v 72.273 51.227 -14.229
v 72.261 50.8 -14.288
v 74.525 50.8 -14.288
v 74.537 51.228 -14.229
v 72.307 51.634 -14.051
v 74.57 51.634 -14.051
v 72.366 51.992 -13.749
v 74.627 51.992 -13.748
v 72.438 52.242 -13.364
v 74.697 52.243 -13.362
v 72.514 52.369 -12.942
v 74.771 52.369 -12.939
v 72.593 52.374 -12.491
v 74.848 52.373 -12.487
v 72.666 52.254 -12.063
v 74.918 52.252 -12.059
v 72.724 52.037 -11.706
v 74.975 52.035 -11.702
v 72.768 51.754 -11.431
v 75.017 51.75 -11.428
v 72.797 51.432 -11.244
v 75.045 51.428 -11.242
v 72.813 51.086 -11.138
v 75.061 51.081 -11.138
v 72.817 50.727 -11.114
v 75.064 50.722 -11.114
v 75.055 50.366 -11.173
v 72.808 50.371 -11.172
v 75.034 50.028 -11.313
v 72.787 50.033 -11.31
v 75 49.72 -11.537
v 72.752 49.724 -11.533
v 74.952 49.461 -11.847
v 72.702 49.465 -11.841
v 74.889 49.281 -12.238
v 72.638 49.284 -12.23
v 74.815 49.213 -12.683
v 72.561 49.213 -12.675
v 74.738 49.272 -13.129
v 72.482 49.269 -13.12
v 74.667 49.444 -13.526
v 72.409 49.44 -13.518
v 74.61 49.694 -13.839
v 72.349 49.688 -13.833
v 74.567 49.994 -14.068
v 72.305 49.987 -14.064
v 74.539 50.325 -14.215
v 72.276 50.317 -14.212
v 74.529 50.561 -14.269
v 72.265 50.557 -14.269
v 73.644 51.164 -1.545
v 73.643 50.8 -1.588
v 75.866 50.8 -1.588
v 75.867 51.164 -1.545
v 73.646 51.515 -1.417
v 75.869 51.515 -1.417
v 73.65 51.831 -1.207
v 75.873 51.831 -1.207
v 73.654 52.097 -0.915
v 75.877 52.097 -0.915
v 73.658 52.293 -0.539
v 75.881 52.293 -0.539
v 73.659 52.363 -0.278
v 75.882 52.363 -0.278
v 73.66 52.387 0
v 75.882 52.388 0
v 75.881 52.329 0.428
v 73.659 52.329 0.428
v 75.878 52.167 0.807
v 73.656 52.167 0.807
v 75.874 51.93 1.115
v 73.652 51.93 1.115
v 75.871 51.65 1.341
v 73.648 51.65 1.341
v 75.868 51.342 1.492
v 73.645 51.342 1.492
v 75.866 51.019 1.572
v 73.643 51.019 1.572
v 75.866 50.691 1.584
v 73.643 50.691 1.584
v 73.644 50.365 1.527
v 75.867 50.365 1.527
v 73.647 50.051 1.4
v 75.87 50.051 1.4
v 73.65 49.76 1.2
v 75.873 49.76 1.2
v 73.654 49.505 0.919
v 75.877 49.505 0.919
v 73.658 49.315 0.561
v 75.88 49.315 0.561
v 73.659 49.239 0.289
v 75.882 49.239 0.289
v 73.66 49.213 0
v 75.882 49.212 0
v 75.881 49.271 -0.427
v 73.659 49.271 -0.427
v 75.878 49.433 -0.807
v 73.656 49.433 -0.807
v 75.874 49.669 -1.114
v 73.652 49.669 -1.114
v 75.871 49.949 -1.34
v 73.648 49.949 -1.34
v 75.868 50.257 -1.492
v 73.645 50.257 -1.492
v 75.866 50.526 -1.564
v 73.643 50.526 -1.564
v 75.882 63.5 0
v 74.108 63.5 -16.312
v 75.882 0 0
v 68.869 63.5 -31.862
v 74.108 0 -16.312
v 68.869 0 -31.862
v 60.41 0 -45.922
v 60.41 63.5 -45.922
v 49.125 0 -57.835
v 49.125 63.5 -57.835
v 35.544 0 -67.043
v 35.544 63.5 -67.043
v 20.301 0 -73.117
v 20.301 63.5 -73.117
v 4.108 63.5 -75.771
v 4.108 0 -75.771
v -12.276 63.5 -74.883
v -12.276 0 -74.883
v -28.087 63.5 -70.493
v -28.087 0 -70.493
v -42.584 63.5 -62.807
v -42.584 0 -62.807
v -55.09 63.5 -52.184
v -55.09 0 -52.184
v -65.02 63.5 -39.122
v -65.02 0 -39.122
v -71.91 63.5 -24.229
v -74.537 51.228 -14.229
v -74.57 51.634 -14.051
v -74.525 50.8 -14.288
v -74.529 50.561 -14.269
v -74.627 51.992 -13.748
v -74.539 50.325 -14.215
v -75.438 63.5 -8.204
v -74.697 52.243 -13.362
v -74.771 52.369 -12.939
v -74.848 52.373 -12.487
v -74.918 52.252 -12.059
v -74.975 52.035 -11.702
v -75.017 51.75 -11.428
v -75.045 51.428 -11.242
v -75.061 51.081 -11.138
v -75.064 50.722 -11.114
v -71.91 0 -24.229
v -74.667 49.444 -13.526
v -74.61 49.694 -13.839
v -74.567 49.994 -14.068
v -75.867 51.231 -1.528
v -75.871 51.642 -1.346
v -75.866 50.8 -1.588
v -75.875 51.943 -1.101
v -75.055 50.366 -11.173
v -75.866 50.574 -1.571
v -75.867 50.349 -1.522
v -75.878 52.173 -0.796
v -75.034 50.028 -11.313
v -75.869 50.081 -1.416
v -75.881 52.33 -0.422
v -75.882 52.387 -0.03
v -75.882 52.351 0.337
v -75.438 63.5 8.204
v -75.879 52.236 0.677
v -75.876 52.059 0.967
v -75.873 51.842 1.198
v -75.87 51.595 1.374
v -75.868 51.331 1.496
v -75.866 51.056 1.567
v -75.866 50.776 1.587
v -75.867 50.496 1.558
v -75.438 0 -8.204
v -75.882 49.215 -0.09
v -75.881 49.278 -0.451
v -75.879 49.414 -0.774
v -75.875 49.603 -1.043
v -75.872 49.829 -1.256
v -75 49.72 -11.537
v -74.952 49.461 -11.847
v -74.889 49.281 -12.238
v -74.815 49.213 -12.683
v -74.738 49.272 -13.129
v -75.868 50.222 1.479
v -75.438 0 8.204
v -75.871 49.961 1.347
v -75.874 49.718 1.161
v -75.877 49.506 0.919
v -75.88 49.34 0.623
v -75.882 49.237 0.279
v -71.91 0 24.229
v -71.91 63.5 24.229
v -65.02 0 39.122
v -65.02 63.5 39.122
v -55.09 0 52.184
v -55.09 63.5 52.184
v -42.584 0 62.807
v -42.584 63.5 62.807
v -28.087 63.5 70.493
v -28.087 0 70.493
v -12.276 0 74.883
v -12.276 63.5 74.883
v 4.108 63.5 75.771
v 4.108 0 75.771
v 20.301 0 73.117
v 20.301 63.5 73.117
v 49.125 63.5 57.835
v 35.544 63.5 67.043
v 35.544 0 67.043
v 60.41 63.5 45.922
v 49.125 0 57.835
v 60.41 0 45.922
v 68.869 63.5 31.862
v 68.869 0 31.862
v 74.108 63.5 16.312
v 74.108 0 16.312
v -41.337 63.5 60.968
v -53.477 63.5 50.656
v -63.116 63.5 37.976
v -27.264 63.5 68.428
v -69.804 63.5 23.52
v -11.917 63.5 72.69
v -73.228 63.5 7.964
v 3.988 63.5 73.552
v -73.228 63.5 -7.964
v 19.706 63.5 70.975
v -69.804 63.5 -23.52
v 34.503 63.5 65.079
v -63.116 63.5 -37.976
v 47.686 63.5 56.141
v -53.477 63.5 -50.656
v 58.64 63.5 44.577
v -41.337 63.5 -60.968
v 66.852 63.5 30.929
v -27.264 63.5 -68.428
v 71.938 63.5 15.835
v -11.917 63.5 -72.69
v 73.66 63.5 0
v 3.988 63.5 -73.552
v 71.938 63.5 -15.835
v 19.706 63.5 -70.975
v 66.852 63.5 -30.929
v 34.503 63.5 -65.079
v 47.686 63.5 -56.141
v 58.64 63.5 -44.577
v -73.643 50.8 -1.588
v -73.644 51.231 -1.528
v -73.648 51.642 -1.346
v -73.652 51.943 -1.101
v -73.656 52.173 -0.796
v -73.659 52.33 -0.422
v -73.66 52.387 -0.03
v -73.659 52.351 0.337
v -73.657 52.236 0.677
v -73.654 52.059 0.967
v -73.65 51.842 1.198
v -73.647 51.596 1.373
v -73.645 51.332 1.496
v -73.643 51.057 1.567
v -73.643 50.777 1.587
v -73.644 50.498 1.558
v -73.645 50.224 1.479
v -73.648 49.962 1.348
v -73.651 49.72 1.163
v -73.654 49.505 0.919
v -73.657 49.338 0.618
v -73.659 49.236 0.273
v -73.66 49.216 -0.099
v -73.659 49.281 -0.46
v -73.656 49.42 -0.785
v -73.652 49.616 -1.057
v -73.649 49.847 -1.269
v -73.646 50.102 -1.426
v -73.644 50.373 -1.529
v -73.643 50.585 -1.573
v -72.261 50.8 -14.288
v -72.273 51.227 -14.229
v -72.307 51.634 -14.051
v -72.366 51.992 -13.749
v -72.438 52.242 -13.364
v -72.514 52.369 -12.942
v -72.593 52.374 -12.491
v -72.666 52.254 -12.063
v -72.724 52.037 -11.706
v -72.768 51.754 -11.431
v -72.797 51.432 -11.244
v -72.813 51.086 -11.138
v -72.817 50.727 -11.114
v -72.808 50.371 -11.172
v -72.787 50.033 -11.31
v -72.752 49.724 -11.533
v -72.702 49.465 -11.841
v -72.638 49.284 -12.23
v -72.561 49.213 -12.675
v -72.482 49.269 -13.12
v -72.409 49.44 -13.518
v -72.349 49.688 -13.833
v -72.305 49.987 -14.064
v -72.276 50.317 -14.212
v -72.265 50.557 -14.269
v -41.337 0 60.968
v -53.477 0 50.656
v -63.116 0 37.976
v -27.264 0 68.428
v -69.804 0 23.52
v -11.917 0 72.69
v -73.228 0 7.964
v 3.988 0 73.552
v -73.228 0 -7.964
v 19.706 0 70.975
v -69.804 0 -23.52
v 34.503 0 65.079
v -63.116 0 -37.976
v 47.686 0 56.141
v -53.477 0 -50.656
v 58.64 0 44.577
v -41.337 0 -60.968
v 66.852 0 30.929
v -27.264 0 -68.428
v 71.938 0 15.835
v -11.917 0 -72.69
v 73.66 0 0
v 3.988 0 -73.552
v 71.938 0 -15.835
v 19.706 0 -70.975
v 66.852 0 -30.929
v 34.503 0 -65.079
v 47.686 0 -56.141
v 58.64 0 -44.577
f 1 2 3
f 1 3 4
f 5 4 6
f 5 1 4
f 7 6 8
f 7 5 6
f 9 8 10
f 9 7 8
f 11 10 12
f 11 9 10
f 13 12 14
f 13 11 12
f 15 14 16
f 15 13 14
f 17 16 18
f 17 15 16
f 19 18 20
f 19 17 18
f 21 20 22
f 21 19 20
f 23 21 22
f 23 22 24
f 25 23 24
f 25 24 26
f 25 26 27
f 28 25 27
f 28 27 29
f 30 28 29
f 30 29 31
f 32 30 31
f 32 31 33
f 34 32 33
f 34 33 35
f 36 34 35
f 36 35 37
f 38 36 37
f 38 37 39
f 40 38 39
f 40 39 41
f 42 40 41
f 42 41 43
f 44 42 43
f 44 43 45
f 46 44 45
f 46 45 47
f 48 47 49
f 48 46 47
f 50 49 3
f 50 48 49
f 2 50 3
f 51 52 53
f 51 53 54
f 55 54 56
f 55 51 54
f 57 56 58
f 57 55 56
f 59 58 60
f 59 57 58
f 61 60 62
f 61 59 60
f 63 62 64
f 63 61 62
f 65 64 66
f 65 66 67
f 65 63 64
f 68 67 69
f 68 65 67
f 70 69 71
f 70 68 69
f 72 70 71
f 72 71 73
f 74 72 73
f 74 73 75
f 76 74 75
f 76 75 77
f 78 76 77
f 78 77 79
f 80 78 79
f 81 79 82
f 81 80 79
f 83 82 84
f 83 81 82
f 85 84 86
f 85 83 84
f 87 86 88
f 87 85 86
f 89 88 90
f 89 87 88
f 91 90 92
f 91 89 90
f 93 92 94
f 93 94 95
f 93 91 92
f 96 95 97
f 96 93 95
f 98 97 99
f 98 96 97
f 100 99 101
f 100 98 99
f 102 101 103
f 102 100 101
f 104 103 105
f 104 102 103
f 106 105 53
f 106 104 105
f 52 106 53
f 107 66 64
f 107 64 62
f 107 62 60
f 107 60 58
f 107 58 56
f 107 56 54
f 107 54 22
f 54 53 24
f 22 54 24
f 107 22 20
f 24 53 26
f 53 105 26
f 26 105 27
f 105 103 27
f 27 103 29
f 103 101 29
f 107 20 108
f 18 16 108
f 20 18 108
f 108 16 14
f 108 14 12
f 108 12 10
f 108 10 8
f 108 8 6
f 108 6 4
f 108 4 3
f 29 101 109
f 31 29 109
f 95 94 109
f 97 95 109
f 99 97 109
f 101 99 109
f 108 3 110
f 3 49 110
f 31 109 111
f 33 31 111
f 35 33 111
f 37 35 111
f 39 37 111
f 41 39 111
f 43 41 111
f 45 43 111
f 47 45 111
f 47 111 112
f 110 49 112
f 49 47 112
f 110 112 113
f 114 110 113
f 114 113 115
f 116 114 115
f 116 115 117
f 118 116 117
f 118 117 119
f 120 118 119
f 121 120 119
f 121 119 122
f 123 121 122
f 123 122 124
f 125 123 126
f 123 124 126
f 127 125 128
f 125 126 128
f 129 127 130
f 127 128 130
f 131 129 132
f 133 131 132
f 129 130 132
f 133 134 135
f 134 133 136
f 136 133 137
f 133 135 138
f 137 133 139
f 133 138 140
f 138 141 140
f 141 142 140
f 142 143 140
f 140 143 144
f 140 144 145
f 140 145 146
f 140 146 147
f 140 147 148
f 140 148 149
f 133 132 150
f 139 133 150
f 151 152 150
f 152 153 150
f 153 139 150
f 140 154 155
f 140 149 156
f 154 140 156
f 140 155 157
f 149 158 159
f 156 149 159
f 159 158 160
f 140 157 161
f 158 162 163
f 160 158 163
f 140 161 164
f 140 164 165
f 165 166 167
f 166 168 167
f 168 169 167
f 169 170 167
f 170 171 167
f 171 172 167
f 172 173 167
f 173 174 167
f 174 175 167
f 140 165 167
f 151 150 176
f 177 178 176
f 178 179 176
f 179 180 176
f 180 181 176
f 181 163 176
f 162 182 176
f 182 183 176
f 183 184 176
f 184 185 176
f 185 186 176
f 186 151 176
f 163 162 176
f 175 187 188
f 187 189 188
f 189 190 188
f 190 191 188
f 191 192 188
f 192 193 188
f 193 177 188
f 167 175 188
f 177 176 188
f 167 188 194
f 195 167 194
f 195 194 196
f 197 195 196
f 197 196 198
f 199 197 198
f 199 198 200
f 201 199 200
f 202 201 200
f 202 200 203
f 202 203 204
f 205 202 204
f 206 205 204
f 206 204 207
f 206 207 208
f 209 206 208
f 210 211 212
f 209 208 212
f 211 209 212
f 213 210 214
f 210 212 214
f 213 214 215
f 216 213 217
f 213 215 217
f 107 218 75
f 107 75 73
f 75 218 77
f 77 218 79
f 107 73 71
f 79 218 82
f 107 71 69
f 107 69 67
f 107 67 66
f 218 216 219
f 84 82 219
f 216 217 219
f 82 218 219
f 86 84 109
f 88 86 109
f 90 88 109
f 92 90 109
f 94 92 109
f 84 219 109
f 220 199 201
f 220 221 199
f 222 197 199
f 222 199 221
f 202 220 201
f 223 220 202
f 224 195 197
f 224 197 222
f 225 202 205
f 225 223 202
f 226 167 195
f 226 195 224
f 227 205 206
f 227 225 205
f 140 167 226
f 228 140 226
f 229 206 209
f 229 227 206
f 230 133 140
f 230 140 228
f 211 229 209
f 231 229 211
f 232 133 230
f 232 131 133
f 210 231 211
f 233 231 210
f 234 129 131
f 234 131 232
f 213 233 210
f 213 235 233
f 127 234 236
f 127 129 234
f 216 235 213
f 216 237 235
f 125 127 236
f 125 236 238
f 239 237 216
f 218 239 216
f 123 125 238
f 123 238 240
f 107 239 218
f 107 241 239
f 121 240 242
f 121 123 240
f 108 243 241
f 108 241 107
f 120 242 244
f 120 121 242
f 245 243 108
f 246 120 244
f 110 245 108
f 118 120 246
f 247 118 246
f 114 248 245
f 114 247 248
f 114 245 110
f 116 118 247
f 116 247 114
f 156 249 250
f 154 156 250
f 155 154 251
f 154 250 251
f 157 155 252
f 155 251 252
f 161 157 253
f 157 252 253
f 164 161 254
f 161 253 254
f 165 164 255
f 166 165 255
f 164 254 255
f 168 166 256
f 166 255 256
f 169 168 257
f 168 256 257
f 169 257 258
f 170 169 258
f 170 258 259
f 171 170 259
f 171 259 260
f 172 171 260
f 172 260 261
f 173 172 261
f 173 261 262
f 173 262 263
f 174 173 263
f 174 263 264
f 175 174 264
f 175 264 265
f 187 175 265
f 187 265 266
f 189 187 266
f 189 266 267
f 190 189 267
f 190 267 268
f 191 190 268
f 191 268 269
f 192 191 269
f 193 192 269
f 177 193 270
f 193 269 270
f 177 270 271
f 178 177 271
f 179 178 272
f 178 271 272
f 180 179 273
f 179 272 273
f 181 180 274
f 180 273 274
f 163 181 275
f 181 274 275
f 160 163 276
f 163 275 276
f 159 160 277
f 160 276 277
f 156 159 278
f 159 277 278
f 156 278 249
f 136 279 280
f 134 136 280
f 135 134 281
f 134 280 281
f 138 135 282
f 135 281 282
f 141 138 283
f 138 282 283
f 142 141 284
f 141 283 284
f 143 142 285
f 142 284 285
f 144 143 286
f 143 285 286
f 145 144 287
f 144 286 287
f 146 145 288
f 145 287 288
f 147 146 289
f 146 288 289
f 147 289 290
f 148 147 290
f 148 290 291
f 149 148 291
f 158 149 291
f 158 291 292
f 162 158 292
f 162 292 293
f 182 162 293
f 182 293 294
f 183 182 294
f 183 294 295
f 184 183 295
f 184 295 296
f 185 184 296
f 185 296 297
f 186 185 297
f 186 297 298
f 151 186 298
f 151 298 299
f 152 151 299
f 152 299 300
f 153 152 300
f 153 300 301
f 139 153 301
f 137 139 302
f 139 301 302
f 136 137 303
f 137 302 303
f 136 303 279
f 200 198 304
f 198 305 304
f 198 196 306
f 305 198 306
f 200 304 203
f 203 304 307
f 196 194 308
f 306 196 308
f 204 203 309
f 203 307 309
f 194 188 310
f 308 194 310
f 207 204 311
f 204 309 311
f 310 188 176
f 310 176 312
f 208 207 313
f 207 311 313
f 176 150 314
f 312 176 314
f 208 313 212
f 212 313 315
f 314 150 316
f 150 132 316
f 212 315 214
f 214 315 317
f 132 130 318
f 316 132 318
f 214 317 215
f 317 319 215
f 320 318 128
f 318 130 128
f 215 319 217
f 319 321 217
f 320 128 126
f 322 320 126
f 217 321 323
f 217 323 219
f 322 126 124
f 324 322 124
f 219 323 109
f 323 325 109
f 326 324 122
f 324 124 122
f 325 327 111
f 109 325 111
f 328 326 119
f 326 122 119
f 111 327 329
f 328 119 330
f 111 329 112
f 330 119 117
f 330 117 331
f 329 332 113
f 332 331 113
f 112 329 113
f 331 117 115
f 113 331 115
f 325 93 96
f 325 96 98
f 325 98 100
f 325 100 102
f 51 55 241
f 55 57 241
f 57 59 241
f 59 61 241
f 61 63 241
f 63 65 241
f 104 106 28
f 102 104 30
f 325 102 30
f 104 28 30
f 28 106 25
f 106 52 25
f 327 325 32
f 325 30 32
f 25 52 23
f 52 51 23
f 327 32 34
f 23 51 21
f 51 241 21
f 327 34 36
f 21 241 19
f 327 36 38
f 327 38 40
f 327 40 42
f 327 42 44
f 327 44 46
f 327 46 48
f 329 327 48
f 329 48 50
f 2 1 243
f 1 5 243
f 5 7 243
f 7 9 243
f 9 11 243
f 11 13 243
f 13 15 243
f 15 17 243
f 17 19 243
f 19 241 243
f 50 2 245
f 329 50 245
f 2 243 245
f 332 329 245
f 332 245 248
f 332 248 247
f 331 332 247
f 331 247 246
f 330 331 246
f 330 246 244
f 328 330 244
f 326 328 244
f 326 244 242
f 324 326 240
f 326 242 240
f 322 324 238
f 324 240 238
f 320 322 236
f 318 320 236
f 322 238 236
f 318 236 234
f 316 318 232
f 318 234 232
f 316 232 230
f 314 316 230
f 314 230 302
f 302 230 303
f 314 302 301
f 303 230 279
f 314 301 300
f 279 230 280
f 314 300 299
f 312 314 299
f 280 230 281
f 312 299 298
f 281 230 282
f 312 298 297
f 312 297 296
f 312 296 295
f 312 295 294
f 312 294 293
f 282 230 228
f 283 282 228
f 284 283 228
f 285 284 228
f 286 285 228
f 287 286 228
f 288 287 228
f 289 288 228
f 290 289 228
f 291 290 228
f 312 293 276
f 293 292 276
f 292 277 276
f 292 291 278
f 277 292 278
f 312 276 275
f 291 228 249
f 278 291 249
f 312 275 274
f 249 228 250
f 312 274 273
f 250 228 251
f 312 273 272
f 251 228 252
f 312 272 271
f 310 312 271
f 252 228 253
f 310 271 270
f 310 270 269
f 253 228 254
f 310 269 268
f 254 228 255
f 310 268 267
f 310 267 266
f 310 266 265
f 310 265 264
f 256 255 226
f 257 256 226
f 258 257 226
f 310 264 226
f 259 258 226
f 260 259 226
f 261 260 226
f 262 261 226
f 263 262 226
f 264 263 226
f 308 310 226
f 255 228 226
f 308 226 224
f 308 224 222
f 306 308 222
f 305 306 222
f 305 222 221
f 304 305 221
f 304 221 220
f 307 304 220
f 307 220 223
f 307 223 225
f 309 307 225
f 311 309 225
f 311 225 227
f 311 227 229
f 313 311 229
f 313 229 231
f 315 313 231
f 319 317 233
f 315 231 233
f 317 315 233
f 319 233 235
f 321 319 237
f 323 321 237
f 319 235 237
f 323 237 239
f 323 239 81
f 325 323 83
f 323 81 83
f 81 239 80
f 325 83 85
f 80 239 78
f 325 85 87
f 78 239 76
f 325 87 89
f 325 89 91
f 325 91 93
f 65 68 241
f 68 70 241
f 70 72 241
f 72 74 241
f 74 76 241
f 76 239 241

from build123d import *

# Parameters (mm, degrees)
SKETCH1_R               = 75.8825
BOSS_EXTRUDE1_DEPTH     = 63.5
SKETCH2_R               = 73.66
CUT_EXTRUDE1_DEPTH      = 101.6
SKETCH4_R               = 1.5875
CUT_EXTRUDE4_DEPTH      = 76.8825
CUT_EXTRUDE4_DEPTH_BACK = 76.8825


with BuildPart() as part:
    # Sketch1 → Boss-Extrude1 (new body)
    with BuildSketch(Plane(origin=(0, 0, 0), x_dir=(1, 0, 0), z_dir=(0, 1, 0))):
        Circle(SKETCH1_R)
    extrude(amount=BOSS_EXTRUDE1_DEPTH)

    # Sketch2 → Cut-Extrude1 (cut)
    with BuildSketch(Plane(origin=(0, 63.5, 0), x_dir=(1, 0, 0), z_dir=(0, 1, 0))):
        Circle(SKETCH2_R)
    extrude(amount=-CUT_EXTRUDE1_DEPTH, mode=Mode.SUBTRACT)

    # Sketch4 → Cut-Extrude4 (cut, two sides)
    with BuildSketch(Plane(origin=(0, 0, 0), x_dir=(0, 0, -1), z_dir=(1, 0, 0))) as cut_extrude4_sk:
        with Locations((0, 50.8)):
            Circle(SKETCH4_R)
        with Locations((12.7, 50.8)):
            Circle(SKETCH4_R)
    extrude(amount=CUT_EXTRUDE4_DEPTH, mode=Mode.SUBTRACT)
    extrude(cut_extrude4_sk.sketch, amount=-CUT_EXTRUDE4_DEPTH_BACK, mode=Mode.SUBTRACT)


solid = part.part
